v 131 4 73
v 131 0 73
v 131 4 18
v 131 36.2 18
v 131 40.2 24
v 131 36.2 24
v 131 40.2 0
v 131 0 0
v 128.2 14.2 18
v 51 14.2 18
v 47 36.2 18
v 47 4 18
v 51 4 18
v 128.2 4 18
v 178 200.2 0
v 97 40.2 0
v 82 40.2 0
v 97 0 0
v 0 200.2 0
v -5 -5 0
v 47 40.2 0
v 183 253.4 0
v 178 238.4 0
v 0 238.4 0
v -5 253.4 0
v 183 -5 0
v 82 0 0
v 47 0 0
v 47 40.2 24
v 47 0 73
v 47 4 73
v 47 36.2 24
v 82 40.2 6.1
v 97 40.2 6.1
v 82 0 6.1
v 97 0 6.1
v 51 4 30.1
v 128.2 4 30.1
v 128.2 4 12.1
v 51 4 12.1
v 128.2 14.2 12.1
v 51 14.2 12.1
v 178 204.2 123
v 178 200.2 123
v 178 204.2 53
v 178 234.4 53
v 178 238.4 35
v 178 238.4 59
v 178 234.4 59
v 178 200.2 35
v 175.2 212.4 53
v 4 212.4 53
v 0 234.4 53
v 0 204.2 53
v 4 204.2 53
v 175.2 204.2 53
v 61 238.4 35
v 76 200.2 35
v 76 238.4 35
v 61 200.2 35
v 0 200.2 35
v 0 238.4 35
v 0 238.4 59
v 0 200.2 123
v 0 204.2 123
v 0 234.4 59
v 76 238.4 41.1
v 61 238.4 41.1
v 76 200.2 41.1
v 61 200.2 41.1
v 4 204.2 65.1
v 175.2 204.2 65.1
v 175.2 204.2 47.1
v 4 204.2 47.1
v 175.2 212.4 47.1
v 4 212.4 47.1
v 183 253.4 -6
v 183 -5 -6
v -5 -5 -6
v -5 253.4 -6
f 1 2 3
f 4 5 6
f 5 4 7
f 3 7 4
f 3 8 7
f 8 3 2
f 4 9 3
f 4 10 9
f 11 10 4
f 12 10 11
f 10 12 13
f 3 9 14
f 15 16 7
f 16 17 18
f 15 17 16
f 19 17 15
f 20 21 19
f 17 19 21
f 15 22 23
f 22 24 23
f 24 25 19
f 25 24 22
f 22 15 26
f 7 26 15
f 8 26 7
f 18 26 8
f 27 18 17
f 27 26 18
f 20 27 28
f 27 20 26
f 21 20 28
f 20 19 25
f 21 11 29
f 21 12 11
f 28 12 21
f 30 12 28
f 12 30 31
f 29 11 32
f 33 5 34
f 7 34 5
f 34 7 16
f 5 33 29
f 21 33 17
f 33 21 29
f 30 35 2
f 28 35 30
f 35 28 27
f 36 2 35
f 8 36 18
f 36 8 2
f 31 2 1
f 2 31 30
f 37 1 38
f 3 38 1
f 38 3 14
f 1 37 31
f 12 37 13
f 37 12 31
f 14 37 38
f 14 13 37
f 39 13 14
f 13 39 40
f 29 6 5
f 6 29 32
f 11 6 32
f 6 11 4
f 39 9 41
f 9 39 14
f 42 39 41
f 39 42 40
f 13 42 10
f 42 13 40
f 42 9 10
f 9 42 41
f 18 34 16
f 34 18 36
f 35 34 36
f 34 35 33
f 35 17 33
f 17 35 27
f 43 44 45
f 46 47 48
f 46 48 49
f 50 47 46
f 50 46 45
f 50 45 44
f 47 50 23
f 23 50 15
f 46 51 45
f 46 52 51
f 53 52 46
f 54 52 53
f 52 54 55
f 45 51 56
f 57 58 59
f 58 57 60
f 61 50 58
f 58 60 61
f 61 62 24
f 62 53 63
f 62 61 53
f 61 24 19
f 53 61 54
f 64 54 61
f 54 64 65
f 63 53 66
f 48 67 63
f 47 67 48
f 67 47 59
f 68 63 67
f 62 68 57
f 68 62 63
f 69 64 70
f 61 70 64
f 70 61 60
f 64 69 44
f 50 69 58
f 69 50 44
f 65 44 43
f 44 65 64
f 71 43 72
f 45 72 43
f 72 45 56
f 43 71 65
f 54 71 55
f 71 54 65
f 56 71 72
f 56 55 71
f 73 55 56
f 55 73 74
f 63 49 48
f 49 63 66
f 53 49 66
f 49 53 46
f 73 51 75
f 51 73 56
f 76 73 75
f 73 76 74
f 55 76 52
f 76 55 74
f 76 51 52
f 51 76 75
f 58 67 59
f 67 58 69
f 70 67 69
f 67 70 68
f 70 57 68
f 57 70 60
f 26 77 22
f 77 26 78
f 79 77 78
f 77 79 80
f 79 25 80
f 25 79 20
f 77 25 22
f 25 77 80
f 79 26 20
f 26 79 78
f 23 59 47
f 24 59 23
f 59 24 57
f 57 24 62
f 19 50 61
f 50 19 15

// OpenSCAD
// ============================================================
// qa_jig.scad - 폰(카메라) <-> 태블릿 고정 지그
//   목적: 카메라-태블릿 거리/각도를 영구 고정 -> 좌표 캘리브 1회로 끝
//   단위: mm.  OpenSCAD에서 열고 F6 -> STL export.
//
// 배치: 폰과 태블릿을 세워서 마주봄. 폰 뒷면(카메라)이 태블릿 화면을 향함.
//       태블릿 받침이 폰보다 35mm 높음. 둘은 베이스 한 장으로 연결(기하 고정).
// ============================================================

$fn = 48;
eps = 0.1;

// ---------------- 폰 (Pixel 7 Pro) ----------------
phone_w  = 76;     // 폭
phone_h  = 162;    // 높이
phone_t  = 9;      // 두께
phone_port_x0 = 34;   // 바닥 USB-C 시작 (왼쪽에서)
phone_port_x1 = 43;   // 바닥 USB-C 끝
// 렌즈 위치(참고용 주석): 위에서 27mm, 왼쪽에서 32mm(근접 촬영용 렌즈)
//   ※ 폰을 뒤집어 장착하면 카메라 시점 기준 '오른쪽 32mm'가 됨 -> 센터링 시 반전 고려

// ---------------- 태블릿 (TODO: 실측값 입력!) ----------------
tablet_w  = 170;   // <<< 측정 필요
tablet_h  = 250;   // <<< 측정 필요 (받침 높이 차 3.5cm는 이 값과 무관하게 고정)
tablet_t  = 7;     // <<< 측정 필요
tablet_port_x0 = 60;  // <<< 바닥 USB-C 시작 (왼쪽에서, 카메라 시점 기준 확인)
tablet_port_x1 = 69;  // <<<

// ---------------- 기하 ----------------
gap        = 190;  // 촬영거리 Z: 폰 뒷면 ~ 태블릿 화면 (19cm)
tablet_rise = 35;  // 태블릿이 폰보다 높게 (3.5cm)

// ---------------- 공통 구조 파라미터 ----------------
slot_depth = 18;   // 기기 바닥이 슬롯에 들어가는 깊이
slot_tol   = 0.6;  // 끼움 여유(편면). 출력물 타이트하면 키워
wall       = 4;    // 슬롯 벽 두께
back_h_phone  = 55;  // 폰 뒷벽 높이(지지)
back_h_tablet = 70;  // 태블릿 뒷벽 높이(무거우니 더 높게)
front_lip  = 6;    // 앞턱 높이(화면 가리지 않게 낮게)
base_th    = 6;    // 베이스 두께
foot       = 22;   // 앞쪽 발 길이(넘어짐 방지)
cable_pad  = 3;    // 케이블 구멍 양옆 여유

JOIN_BASE  = true; // true=베이스로 연결(권장), false=받침 분리

// ============================================================
// 모듈: 기기 받침 (바닥 슬롯 + 뒷벽 + 앞턱 + 케이블 구멍)
//   기기는 X폭 방향으로 눕혀 세움. 슬롯은 Y두께 방향.
//   화면(또는 카메라)이 향하는 쪽 = +Y (앞), 뒷벽 = -Y (뒤)
// ============================================================
module device_holder(dev_w, dev_t, back_h, port_x0, port_x1) {
    holder_w = dev_w + 2*wall;
    holder_d = dev_t + 2*slot_tol + 2*wall + foot;  // 앞쪽 발 포함
    slot_w   = dev_w + 2*slot_tol;
    slot_t   = dev_t + 2*slot_tol;

    difference() {
        union() {
            // 받침 몸체(슬롯 깊이만큼)
            cube([holder_w, holder_d, slot_depth]);
            // 뒷벽(지지)
            translate([0, 0, 0])
                cube([holder_w, wall, slot_depth + back_h]);
            // 앞턱(낮게)
            translate([0, holder_d - wall, 0])
                cube([holder_w, wall, slot_depth + front_lip]);
        }
        // 슬롯(기기 끼우는 홈) - 뒷벽에서 wall만큼 떨어진 위치
        translate([wall, wall, slot_depth - slot_depth + base_th + eps])
            translate([0, 0, base_th])
            cube([slot_w, slot_t, slot_depth]);
        // 케이블 구멍: 슬롯 바닥을 관통 (포트 x위치)
        cw = (port_x1 - port_x0) + 2*cable_pad;
        translate([wall + port_x0 - cable_pad, -eps, -eps])
            cube([cw, holder_d + 2*eps, base_th + 2*eps]);
    }
}

// ============================================================
// 모듈: 높이 스페이서 (태블릿 받침 아래 끼워 35mm 올림 / 조절용)
// ============================================================
module spacer(w, d, h) {
    cube([w, d, h]);
}

// ============================================================
// 배치
// ============================================================
phone_holder_d  = phone_t  + 2*slot_tol + 2*wall + foot;
tablet_holder_d = tablet_t + 2*slot_tol + 2*wall + foot;

// 폰: 카메라(뒷면)가 +Y(태블릿) 쪽을 향하도록.
//   폰 뒷면 = 슬롯 앞면(+Y쪽). 폰 뒷면 Y좌표 = phone_holder_d - foot - wall
phone_back_y = phone_holder_d - foot - wall;
// 태블릿 화면면이 폰을 향함(-Y쪽). 태블릿 화면 Y = 폰뒷면 + gap
tablet_screen_y = phone_back_y + gap;
tablet_holder_y0 = tablet_screen_y - wall;  // 태블릿 받침 시작 위치

// X 중심 정렬
max_w = max(phone_w, tablet_w) + 2*wall;
phone_x  = (max_w - (phone_w  + 2*wall))/2;
tablet_x = (max_w - (tablet_w + 2*wall))/2;

// --- 베이스 ---
if (JOIN_BASE) {
    base_len = tablet_holder_y0 + tablet_holder_d + 10;
    color("LightGray")
    translate([-5, -5, -base_th])
        cube([max_w + 10, base_len + 10, base_th]);
}

// --- 폰 받침 ---
color("SkyBlue")
translate([phone_x, 0, 0])
    device_holder(phone_w, phone_t, back_h_phone, phone_port_x0, phone_port_x1);

// --- 태블릿 받침 (35mm 스페이서 위에) ---
color("Khaki")
translate([tablet_x, tablet_holder_y0, tablet_rise])
    device_holder(tablet_w, tablet_t, back_h_tablet, tablet_port_x0, tablet_port_x1);

// --- 태블릿 스페이서(35mm) ---
color("Salmon")
translate([tablet_x, tablet_holder_y0, 0])
    spacer(tablet_w + 2*wall, tablet_holder_d, tablet_rise);

// ============================================================
// 참고: 렌즈 광축 시각화 (출력 안 됨, %로 미리보기만)
// ============================================================
%translate([tablet_x + tablet_w/2, phone_back_y, tablet_rise + slot_depth + 60])
    rotate([90,0,0])
    cylinder(h=gap, r=1);
